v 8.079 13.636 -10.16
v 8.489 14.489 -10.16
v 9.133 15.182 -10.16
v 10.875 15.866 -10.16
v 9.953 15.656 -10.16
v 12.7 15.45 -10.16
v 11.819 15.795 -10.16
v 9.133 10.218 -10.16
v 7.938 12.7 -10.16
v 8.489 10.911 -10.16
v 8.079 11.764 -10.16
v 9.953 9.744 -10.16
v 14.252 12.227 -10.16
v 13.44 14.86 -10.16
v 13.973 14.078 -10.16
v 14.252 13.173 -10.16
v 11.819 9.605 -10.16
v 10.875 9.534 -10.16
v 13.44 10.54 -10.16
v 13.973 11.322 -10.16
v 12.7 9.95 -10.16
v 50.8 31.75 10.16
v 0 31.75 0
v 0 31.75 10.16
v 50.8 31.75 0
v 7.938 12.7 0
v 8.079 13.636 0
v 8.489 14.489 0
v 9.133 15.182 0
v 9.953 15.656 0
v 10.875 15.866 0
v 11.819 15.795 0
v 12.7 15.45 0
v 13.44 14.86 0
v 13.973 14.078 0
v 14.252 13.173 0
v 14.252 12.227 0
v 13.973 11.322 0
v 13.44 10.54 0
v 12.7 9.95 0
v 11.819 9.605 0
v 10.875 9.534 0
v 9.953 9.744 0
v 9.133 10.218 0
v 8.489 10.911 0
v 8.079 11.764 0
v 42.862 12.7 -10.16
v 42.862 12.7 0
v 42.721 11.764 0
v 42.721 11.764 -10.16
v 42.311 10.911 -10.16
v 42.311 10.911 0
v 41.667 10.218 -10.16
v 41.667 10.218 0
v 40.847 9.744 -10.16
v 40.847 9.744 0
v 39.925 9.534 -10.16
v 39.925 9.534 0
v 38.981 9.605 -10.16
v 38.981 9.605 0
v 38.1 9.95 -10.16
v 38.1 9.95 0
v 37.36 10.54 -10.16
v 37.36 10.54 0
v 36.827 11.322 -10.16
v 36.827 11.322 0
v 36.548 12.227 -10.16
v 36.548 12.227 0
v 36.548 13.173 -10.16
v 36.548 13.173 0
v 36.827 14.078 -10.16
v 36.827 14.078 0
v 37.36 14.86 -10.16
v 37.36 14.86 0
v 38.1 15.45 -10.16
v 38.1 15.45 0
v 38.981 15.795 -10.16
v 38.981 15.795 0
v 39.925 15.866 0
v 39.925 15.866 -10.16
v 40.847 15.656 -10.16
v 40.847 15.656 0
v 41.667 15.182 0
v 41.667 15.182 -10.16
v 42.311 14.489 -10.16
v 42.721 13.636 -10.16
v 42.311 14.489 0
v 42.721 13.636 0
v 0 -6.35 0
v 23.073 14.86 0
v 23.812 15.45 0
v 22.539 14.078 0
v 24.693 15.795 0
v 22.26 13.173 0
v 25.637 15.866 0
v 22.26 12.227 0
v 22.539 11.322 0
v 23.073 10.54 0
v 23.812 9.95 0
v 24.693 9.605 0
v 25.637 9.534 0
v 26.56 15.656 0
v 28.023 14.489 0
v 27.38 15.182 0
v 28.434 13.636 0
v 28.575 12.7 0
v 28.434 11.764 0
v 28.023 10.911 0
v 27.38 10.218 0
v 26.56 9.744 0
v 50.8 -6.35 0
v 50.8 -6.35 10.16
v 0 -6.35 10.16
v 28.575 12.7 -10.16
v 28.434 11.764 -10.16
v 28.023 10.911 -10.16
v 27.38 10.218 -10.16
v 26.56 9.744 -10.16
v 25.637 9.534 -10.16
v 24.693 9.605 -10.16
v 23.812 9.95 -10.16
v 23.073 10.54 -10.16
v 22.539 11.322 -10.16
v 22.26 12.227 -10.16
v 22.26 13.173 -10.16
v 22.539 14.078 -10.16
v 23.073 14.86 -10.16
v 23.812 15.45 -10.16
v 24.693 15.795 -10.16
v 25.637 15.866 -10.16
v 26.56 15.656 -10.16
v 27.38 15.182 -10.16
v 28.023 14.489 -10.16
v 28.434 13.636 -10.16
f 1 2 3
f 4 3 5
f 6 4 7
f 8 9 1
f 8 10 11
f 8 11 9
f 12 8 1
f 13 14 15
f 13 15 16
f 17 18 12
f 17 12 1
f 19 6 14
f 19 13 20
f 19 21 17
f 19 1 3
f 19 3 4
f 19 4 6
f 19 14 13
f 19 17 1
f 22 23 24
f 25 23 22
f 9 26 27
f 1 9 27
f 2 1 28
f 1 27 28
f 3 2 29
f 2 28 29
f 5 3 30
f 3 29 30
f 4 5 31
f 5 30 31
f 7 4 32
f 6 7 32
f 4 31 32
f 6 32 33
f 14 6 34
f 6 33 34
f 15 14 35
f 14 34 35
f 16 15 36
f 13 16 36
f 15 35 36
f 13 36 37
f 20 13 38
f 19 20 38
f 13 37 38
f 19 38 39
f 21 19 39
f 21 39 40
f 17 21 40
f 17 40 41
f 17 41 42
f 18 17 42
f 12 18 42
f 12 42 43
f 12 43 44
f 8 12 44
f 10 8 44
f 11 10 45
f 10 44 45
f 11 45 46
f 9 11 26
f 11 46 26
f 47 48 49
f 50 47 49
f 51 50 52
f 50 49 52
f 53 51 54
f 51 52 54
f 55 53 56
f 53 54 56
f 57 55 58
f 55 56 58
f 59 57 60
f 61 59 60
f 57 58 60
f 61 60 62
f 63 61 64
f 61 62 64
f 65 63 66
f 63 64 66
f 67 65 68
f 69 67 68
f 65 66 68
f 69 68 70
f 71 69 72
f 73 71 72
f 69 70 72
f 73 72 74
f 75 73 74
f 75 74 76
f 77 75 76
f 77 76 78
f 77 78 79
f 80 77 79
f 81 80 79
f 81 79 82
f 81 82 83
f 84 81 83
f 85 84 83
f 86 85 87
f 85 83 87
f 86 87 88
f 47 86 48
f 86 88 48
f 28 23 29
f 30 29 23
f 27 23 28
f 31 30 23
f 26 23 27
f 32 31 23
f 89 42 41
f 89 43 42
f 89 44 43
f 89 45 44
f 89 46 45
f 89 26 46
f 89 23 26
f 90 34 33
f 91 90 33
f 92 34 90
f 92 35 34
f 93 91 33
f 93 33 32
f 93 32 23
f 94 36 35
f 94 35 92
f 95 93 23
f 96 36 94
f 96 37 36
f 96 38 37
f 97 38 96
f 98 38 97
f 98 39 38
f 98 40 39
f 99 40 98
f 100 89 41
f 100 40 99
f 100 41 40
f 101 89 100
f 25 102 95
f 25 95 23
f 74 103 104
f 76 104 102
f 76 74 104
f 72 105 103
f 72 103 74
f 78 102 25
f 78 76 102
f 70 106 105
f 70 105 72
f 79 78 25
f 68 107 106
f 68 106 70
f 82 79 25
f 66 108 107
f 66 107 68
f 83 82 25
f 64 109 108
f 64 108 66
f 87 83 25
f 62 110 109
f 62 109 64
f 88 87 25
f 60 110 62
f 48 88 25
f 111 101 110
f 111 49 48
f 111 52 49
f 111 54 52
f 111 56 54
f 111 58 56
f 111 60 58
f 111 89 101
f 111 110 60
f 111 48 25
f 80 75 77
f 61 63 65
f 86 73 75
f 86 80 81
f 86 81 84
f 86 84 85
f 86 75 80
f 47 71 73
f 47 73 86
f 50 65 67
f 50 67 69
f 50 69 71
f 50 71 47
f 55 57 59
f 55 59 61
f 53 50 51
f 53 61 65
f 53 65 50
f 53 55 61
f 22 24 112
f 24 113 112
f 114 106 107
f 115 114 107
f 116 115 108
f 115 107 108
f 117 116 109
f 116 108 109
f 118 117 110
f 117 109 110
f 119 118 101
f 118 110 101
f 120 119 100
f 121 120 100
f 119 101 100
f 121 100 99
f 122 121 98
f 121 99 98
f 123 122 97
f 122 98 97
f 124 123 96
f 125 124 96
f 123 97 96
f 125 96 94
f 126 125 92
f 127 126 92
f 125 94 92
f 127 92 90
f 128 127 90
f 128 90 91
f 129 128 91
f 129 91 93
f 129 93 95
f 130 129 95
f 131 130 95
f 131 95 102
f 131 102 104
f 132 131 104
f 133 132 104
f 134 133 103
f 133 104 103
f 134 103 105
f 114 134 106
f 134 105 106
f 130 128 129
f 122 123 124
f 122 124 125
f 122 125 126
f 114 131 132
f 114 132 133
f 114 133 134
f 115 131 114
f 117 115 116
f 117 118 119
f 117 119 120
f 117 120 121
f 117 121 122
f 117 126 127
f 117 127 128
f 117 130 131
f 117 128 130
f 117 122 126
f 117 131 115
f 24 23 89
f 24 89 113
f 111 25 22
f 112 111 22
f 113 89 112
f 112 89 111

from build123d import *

# Parameters (mm, degrees)
F0_W     = 50.8
F0_H     = 25.4
F1_DEPTH = 10.16
F2_R     = 3.175
F3_DEPTH = 10.16
F5_DEPTH = 10.16
F6_DEPTH = 6.35
F7_DEPTH = 6.35


with BuildPart() as f1:
    # F0 (on Top) → F1 (new body)
    with BuildSketch(Plane.XY):
        with Locations((25.4, 12.7)):
            Rectangle(F0_W, F0_H)
    extrude(amount=F1_DEPTH)

    # F2 (on face) → F3 (join)
    with BuildSketch(Plane(origin=(0, 0, 0), x_dir=(1, 0, 0), z_dir=(0, 0, -1))):
        with Locations((25.4, -12.7)):
            Circle(F2_R)
    extrude(amount=F3_DEPTH)

    # F4 (on face) → F5 (join)
    with BuildSketch(Plane(origin=(0, 0, 0), x_dir=(1, 0, 0), z_dir=(0, 0, -1))):
        with BuildLine():
            Line((7.9375, -12.7), (14.2875, -12.7))
            ThreePointArc((14.2875, -12.7), (11.1125, -9.525), (7.9375, -12.7))
        make_face()
        with BuildLine():
            ThreePointArc((7.9375, -12.7), (11.1125, -15.875), (14.2875, -12.7))
            Line((14.2875, -12.7), (7.9375, -12.7))
        make_face()
        with BuildLine():
            Line((42.8625, -12.7), (36.5125, -12.7))
            ThreePointArc((36.5125, -12.7), (39.6875, -15.875), (42.8625, -12.7))
        make_face()
        with BuildLine():
            ThreePointArc((42.8625, -12.7), (39.6875, -9.525), (36.5125, -12.7))
            Line((36.5125, -12.7), (42.8625, -12.7))
        make_face()
    extrude(amount=F5_DEPTH)

    # F6 (add): a face of the model
    f6_faces = [f1.faces().sort_by_distance(p)[0] for p in [
        (25.4, 0, 5.08),
    ]]
    extrude(f6_faces, amount=F6_DEPTH)

    # F7 (add): a face of the model
    f7_faces = [f1.faces().sort_by_distance(p)[0] for p in [
        (25.4, 25.4, 5.08),
    ]]
    extrude(f7_faces, amount=F7_DEPTH)


solid = f1.part
